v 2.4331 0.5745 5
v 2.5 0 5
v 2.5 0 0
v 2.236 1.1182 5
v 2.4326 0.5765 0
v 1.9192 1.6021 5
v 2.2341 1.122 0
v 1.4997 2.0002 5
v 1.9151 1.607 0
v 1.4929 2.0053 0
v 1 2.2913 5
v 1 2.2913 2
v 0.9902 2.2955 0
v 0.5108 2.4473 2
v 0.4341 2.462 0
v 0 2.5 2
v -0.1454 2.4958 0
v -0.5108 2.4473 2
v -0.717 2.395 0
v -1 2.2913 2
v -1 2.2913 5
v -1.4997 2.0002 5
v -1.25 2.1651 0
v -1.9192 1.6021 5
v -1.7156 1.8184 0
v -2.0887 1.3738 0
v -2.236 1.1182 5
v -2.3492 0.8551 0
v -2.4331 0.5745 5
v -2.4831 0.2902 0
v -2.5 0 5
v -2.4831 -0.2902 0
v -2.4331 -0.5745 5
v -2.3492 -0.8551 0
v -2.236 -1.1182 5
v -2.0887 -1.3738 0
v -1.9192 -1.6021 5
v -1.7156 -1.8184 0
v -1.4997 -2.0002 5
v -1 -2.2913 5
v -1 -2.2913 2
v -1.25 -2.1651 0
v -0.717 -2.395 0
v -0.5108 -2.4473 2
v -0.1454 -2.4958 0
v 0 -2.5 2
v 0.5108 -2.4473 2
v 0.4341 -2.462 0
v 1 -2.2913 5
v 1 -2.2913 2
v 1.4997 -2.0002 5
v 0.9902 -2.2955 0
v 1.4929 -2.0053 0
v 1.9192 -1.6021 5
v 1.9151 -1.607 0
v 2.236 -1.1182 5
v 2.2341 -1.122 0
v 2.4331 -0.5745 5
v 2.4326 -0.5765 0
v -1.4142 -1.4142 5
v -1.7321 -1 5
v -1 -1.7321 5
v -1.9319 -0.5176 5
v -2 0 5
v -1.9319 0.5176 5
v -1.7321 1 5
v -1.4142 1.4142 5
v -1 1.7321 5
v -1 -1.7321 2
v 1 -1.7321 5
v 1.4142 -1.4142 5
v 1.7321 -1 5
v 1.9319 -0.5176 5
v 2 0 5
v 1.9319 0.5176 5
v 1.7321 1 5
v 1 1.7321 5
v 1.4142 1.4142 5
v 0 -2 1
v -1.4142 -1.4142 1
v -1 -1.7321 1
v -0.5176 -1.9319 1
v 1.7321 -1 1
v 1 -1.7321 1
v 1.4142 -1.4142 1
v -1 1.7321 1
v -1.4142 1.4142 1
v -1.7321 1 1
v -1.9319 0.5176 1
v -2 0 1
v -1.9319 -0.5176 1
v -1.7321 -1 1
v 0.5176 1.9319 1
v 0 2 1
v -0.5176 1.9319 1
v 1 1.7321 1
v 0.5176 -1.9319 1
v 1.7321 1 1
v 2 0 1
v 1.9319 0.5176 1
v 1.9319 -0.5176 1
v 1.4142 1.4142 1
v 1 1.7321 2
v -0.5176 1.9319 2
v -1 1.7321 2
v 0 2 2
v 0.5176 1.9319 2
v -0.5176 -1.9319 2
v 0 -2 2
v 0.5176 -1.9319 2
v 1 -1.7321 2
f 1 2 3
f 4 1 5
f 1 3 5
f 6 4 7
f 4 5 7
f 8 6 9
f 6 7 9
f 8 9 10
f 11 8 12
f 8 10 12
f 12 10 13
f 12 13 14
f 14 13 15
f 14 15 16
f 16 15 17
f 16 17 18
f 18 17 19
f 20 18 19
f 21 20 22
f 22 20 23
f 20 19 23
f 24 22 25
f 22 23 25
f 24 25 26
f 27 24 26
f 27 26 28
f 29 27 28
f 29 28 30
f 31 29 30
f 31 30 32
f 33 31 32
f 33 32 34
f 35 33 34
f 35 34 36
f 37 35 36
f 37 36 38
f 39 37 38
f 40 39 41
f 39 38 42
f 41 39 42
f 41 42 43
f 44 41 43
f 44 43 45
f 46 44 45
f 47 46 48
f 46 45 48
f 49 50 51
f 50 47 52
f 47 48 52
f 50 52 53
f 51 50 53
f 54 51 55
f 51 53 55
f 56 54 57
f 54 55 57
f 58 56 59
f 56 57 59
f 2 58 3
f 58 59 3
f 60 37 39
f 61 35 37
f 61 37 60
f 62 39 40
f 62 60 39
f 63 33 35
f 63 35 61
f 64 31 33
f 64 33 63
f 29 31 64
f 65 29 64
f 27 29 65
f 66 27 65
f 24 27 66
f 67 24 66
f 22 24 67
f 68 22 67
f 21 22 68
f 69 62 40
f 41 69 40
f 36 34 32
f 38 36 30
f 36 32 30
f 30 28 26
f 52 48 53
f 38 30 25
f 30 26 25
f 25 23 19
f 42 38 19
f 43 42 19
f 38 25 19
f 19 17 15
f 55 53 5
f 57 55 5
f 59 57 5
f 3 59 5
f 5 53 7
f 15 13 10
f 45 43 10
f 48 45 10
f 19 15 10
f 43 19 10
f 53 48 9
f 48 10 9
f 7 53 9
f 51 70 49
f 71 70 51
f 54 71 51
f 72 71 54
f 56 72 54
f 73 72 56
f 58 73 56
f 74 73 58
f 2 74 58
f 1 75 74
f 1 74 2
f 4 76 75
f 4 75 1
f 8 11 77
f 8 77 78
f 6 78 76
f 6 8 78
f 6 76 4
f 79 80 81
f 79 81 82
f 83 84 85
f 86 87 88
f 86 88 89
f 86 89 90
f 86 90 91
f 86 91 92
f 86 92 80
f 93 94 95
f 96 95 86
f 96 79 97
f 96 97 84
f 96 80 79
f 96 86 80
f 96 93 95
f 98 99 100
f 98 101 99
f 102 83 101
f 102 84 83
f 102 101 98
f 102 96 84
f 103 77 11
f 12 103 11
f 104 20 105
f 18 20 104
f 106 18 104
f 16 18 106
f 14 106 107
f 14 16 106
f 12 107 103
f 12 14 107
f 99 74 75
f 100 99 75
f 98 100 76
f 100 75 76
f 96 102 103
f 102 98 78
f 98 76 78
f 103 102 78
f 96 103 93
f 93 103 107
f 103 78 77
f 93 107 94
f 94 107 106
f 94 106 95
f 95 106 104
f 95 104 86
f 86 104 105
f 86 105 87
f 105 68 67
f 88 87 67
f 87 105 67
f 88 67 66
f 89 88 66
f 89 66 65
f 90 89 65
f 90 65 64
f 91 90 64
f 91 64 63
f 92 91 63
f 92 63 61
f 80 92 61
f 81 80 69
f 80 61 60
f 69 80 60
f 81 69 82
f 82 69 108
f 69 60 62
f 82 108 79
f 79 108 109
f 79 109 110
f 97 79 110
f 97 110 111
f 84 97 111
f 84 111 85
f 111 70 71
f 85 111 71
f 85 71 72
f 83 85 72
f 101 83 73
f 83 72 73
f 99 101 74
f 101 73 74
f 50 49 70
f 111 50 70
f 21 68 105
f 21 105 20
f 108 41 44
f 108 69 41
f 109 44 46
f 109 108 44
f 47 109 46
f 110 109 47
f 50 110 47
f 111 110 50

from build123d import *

# Parameters (mm, degrees)
F0_R     = 2.5
F1_DEPTH = 5
F2_R     = 2
F3_DEPTH = 4
F5_DEPTH = 3
F6_W     = 2
F6_H     = 1.83
F7_DEPTH = 3


with BuildPart() as f1:
    # F0 (on Top) → F1 (new body)
    with BuildSketch(Plane.XY):
        Circle(F0_R)
    extrude(amount=F1_DEPTH)

    # F2 (on face) → F3 (cut)
    with BuildSketch(Plane.XY.offset(5)):
        Circle(F2_R)
    extrude(amount=-F3_DEPTH, mode=Mode.SUBTRACT)

    # F4 (on face) → F5 (cut)
    with BuildSketch(Plane.XY.offset(5)):
        with BuildLine():
            ThreePointArc((-1, -2.2912878475), (0, -2.5), (1, -2.2912878475))
            Line((1, -2.2912878475), (1, -1.7320508076))
            ThreePointArc((1, -1.7320508076), (0, -2), (-1, -1.7320508076))
            Line((-1, -1.7320508076), (-1, -2.2912878475))
        make_face()
    extrude(amount=-F5_DEPTH, mode=Mode.SUBTRACT)

    # F6 (on face) → F7 (cut)
    with BuildSketch(Plane.XY.offset(5)):
        with Locations((0, 2)):
            Rectangle(F6_W, F6_H)
    extrude(amount=-F7_DEPTH, mode=Mode.SUBTRACT)


solid = f1.part
